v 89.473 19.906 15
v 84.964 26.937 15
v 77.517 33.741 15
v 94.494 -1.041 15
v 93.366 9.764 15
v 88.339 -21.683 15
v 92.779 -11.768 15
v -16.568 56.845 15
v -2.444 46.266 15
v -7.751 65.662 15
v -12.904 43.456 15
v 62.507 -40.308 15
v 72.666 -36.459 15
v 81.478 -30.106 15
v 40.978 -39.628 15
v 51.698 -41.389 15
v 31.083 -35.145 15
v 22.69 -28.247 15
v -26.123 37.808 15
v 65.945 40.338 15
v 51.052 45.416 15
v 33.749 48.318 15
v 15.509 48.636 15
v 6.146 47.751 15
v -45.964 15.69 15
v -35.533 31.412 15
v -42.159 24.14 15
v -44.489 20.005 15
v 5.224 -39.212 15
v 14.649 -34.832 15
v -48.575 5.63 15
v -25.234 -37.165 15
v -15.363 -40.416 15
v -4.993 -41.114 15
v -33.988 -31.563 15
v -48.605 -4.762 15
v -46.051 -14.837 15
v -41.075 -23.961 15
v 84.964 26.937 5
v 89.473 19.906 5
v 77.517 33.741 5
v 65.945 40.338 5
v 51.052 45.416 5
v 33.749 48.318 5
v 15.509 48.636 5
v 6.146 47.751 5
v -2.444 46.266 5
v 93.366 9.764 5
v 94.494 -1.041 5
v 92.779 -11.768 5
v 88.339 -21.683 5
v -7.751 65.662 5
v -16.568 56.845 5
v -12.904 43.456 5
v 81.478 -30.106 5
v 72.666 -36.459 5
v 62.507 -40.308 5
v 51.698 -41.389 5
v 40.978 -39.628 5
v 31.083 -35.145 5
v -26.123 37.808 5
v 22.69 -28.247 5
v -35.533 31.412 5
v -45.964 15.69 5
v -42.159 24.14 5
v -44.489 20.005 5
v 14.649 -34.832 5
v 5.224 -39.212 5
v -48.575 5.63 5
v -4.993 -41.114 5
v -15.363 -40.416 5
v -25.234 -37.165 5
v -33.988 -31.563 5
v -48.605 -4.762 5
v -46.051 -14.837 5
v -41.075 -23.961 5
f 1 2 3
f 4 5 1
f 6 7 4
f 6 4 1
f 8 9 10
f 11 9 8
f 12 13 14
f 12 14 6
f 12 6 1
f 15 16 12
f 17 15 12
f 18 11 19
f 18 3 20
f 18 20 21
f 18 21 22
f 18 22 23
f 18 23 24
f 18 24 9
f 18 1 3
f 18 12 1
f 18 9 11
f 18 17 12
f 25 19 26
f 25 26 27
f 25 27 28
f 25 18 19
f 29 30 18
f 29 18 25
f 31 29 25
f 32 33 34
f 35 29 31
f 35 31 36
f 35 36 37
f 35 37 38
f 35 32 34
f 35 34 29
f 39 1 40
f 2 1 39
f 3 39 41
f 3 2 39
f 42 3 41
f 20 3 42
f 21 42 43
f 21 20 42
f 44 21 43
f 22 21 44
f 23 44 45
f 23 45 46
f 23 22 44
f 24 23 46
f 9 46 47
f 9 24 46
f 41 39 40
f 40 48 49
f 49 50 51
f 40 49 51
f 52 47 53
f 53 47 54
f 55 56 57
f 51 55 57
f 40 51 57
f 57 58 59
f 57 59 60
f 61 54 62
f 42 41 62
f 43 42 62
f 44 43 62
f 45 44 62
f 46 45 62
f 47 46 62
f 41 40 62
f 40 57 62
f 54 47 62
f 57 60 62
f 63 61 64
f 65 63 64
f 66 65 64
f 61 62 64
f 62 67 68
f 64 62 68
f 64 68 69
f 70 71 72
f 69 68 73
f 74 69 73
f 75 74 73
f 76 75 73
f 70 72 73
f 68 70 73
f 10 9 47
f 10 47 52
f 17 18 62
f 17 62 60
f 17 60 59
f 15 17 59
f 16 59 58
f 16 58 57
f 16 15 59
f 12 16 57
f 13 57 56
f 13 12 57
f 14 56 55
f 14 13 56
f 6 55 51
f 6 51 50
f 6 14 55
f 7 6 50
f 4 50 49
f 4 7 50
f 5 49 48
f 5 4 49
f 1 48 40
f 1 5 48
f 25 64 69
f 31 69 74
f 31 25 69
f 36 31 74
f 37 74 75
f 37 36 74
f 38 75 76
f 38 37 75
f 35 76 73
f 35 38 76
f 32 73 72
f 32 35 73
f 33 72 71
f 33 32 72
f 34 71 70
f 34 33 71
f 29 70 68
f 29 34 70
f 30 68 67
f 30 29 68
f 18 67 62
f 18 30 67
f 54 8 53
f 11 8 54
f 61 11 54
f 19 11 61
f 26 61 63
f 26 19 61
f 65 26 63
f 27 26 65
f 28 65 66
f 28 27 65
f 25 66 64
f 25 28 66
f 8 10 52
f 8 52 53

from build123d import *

# Parameters (mm, degrees)
CIRCLE001_R        = 41.5
EXTRUSION002_DEPTH = 10
EXTRUSION_DEPTH    = 10
CIRCLE_R           = 41.5
EXTRUSION001_DEPTH = 10
EXTRUSION003_DEPTH = 10


with BuildPart() as extrusion002:
    # Circle001 (on Cut009001_solid) → Extrusion002 (new body)
    with BuildSketch(Plane(origin=(-7.416555, 0.315657, 15), x_dir=(1, 0, 0), z_dir=(0, 0, 1))):
        Circle(CIRCLE001_R)
    extrude(amount=-EXTRUSION002_DEPTH)


with BuildPart() as extrusion:
    # Wire → Extrusion (new body)
    with BuildSketch(Plane(origin=(-7.75138, 65.661741, 15), x_dir=(1, 0, 0), z_dir=(0, 0, -1))):
        Polygon((0, 0), (-8.816291, 8.816291), (-5.098214, 22.403339), (5.346978, 19.539573), align=None)
    extrude(amount=EXTRUSION_DEPTH)


with BuildPart() as fusion:
    # Circle (on Cut009001_solid) → Extrusion001 (new body)
    with BuildSketch(Plane(origin=(53.009071, 0.089991, 15), x_dir=(1, 0, 0), z_dir=(0, 0, 1))):
        Circle(CIRCLE_R)
    extrude(amount=-EXTRUSION001_DEPTH)

    # Fusion: union Extrusion002, Extrusion
    add(extrusion002.part)
    add(extrusion.part)


with BuildPart() as fusion001:
    # Ellipse002 → Extrusion003 (new body)
    with BuildSketch(Plane(origin=(22.469609, 10.829601, 15), x_dir=(1, 0, 0), z_dir=(0, 0, 1))):
        with BuildLine():
            add(Edge.make_bspline(
                [(69, 0), (69, 65.817931), (-34.5, 32.908965), (-138, 0), (-34.5, -32.908965), (69, -65.817931), (69, 0)],
                knots=[0, 0, 0, 2.094395, 2.094395, 4.18879, 4.18879, 6.283185, 6.283185, 6.283185], degree=2, weights=[1, 0.5, 1, 0.5, 1, 0.5, 1]))
        make_face()
    extrude(amount=-EXTRUSION003_DEPTH)

    # Fusion001: union Fusion
    add(fusion.part)


solid = fusion001.part
